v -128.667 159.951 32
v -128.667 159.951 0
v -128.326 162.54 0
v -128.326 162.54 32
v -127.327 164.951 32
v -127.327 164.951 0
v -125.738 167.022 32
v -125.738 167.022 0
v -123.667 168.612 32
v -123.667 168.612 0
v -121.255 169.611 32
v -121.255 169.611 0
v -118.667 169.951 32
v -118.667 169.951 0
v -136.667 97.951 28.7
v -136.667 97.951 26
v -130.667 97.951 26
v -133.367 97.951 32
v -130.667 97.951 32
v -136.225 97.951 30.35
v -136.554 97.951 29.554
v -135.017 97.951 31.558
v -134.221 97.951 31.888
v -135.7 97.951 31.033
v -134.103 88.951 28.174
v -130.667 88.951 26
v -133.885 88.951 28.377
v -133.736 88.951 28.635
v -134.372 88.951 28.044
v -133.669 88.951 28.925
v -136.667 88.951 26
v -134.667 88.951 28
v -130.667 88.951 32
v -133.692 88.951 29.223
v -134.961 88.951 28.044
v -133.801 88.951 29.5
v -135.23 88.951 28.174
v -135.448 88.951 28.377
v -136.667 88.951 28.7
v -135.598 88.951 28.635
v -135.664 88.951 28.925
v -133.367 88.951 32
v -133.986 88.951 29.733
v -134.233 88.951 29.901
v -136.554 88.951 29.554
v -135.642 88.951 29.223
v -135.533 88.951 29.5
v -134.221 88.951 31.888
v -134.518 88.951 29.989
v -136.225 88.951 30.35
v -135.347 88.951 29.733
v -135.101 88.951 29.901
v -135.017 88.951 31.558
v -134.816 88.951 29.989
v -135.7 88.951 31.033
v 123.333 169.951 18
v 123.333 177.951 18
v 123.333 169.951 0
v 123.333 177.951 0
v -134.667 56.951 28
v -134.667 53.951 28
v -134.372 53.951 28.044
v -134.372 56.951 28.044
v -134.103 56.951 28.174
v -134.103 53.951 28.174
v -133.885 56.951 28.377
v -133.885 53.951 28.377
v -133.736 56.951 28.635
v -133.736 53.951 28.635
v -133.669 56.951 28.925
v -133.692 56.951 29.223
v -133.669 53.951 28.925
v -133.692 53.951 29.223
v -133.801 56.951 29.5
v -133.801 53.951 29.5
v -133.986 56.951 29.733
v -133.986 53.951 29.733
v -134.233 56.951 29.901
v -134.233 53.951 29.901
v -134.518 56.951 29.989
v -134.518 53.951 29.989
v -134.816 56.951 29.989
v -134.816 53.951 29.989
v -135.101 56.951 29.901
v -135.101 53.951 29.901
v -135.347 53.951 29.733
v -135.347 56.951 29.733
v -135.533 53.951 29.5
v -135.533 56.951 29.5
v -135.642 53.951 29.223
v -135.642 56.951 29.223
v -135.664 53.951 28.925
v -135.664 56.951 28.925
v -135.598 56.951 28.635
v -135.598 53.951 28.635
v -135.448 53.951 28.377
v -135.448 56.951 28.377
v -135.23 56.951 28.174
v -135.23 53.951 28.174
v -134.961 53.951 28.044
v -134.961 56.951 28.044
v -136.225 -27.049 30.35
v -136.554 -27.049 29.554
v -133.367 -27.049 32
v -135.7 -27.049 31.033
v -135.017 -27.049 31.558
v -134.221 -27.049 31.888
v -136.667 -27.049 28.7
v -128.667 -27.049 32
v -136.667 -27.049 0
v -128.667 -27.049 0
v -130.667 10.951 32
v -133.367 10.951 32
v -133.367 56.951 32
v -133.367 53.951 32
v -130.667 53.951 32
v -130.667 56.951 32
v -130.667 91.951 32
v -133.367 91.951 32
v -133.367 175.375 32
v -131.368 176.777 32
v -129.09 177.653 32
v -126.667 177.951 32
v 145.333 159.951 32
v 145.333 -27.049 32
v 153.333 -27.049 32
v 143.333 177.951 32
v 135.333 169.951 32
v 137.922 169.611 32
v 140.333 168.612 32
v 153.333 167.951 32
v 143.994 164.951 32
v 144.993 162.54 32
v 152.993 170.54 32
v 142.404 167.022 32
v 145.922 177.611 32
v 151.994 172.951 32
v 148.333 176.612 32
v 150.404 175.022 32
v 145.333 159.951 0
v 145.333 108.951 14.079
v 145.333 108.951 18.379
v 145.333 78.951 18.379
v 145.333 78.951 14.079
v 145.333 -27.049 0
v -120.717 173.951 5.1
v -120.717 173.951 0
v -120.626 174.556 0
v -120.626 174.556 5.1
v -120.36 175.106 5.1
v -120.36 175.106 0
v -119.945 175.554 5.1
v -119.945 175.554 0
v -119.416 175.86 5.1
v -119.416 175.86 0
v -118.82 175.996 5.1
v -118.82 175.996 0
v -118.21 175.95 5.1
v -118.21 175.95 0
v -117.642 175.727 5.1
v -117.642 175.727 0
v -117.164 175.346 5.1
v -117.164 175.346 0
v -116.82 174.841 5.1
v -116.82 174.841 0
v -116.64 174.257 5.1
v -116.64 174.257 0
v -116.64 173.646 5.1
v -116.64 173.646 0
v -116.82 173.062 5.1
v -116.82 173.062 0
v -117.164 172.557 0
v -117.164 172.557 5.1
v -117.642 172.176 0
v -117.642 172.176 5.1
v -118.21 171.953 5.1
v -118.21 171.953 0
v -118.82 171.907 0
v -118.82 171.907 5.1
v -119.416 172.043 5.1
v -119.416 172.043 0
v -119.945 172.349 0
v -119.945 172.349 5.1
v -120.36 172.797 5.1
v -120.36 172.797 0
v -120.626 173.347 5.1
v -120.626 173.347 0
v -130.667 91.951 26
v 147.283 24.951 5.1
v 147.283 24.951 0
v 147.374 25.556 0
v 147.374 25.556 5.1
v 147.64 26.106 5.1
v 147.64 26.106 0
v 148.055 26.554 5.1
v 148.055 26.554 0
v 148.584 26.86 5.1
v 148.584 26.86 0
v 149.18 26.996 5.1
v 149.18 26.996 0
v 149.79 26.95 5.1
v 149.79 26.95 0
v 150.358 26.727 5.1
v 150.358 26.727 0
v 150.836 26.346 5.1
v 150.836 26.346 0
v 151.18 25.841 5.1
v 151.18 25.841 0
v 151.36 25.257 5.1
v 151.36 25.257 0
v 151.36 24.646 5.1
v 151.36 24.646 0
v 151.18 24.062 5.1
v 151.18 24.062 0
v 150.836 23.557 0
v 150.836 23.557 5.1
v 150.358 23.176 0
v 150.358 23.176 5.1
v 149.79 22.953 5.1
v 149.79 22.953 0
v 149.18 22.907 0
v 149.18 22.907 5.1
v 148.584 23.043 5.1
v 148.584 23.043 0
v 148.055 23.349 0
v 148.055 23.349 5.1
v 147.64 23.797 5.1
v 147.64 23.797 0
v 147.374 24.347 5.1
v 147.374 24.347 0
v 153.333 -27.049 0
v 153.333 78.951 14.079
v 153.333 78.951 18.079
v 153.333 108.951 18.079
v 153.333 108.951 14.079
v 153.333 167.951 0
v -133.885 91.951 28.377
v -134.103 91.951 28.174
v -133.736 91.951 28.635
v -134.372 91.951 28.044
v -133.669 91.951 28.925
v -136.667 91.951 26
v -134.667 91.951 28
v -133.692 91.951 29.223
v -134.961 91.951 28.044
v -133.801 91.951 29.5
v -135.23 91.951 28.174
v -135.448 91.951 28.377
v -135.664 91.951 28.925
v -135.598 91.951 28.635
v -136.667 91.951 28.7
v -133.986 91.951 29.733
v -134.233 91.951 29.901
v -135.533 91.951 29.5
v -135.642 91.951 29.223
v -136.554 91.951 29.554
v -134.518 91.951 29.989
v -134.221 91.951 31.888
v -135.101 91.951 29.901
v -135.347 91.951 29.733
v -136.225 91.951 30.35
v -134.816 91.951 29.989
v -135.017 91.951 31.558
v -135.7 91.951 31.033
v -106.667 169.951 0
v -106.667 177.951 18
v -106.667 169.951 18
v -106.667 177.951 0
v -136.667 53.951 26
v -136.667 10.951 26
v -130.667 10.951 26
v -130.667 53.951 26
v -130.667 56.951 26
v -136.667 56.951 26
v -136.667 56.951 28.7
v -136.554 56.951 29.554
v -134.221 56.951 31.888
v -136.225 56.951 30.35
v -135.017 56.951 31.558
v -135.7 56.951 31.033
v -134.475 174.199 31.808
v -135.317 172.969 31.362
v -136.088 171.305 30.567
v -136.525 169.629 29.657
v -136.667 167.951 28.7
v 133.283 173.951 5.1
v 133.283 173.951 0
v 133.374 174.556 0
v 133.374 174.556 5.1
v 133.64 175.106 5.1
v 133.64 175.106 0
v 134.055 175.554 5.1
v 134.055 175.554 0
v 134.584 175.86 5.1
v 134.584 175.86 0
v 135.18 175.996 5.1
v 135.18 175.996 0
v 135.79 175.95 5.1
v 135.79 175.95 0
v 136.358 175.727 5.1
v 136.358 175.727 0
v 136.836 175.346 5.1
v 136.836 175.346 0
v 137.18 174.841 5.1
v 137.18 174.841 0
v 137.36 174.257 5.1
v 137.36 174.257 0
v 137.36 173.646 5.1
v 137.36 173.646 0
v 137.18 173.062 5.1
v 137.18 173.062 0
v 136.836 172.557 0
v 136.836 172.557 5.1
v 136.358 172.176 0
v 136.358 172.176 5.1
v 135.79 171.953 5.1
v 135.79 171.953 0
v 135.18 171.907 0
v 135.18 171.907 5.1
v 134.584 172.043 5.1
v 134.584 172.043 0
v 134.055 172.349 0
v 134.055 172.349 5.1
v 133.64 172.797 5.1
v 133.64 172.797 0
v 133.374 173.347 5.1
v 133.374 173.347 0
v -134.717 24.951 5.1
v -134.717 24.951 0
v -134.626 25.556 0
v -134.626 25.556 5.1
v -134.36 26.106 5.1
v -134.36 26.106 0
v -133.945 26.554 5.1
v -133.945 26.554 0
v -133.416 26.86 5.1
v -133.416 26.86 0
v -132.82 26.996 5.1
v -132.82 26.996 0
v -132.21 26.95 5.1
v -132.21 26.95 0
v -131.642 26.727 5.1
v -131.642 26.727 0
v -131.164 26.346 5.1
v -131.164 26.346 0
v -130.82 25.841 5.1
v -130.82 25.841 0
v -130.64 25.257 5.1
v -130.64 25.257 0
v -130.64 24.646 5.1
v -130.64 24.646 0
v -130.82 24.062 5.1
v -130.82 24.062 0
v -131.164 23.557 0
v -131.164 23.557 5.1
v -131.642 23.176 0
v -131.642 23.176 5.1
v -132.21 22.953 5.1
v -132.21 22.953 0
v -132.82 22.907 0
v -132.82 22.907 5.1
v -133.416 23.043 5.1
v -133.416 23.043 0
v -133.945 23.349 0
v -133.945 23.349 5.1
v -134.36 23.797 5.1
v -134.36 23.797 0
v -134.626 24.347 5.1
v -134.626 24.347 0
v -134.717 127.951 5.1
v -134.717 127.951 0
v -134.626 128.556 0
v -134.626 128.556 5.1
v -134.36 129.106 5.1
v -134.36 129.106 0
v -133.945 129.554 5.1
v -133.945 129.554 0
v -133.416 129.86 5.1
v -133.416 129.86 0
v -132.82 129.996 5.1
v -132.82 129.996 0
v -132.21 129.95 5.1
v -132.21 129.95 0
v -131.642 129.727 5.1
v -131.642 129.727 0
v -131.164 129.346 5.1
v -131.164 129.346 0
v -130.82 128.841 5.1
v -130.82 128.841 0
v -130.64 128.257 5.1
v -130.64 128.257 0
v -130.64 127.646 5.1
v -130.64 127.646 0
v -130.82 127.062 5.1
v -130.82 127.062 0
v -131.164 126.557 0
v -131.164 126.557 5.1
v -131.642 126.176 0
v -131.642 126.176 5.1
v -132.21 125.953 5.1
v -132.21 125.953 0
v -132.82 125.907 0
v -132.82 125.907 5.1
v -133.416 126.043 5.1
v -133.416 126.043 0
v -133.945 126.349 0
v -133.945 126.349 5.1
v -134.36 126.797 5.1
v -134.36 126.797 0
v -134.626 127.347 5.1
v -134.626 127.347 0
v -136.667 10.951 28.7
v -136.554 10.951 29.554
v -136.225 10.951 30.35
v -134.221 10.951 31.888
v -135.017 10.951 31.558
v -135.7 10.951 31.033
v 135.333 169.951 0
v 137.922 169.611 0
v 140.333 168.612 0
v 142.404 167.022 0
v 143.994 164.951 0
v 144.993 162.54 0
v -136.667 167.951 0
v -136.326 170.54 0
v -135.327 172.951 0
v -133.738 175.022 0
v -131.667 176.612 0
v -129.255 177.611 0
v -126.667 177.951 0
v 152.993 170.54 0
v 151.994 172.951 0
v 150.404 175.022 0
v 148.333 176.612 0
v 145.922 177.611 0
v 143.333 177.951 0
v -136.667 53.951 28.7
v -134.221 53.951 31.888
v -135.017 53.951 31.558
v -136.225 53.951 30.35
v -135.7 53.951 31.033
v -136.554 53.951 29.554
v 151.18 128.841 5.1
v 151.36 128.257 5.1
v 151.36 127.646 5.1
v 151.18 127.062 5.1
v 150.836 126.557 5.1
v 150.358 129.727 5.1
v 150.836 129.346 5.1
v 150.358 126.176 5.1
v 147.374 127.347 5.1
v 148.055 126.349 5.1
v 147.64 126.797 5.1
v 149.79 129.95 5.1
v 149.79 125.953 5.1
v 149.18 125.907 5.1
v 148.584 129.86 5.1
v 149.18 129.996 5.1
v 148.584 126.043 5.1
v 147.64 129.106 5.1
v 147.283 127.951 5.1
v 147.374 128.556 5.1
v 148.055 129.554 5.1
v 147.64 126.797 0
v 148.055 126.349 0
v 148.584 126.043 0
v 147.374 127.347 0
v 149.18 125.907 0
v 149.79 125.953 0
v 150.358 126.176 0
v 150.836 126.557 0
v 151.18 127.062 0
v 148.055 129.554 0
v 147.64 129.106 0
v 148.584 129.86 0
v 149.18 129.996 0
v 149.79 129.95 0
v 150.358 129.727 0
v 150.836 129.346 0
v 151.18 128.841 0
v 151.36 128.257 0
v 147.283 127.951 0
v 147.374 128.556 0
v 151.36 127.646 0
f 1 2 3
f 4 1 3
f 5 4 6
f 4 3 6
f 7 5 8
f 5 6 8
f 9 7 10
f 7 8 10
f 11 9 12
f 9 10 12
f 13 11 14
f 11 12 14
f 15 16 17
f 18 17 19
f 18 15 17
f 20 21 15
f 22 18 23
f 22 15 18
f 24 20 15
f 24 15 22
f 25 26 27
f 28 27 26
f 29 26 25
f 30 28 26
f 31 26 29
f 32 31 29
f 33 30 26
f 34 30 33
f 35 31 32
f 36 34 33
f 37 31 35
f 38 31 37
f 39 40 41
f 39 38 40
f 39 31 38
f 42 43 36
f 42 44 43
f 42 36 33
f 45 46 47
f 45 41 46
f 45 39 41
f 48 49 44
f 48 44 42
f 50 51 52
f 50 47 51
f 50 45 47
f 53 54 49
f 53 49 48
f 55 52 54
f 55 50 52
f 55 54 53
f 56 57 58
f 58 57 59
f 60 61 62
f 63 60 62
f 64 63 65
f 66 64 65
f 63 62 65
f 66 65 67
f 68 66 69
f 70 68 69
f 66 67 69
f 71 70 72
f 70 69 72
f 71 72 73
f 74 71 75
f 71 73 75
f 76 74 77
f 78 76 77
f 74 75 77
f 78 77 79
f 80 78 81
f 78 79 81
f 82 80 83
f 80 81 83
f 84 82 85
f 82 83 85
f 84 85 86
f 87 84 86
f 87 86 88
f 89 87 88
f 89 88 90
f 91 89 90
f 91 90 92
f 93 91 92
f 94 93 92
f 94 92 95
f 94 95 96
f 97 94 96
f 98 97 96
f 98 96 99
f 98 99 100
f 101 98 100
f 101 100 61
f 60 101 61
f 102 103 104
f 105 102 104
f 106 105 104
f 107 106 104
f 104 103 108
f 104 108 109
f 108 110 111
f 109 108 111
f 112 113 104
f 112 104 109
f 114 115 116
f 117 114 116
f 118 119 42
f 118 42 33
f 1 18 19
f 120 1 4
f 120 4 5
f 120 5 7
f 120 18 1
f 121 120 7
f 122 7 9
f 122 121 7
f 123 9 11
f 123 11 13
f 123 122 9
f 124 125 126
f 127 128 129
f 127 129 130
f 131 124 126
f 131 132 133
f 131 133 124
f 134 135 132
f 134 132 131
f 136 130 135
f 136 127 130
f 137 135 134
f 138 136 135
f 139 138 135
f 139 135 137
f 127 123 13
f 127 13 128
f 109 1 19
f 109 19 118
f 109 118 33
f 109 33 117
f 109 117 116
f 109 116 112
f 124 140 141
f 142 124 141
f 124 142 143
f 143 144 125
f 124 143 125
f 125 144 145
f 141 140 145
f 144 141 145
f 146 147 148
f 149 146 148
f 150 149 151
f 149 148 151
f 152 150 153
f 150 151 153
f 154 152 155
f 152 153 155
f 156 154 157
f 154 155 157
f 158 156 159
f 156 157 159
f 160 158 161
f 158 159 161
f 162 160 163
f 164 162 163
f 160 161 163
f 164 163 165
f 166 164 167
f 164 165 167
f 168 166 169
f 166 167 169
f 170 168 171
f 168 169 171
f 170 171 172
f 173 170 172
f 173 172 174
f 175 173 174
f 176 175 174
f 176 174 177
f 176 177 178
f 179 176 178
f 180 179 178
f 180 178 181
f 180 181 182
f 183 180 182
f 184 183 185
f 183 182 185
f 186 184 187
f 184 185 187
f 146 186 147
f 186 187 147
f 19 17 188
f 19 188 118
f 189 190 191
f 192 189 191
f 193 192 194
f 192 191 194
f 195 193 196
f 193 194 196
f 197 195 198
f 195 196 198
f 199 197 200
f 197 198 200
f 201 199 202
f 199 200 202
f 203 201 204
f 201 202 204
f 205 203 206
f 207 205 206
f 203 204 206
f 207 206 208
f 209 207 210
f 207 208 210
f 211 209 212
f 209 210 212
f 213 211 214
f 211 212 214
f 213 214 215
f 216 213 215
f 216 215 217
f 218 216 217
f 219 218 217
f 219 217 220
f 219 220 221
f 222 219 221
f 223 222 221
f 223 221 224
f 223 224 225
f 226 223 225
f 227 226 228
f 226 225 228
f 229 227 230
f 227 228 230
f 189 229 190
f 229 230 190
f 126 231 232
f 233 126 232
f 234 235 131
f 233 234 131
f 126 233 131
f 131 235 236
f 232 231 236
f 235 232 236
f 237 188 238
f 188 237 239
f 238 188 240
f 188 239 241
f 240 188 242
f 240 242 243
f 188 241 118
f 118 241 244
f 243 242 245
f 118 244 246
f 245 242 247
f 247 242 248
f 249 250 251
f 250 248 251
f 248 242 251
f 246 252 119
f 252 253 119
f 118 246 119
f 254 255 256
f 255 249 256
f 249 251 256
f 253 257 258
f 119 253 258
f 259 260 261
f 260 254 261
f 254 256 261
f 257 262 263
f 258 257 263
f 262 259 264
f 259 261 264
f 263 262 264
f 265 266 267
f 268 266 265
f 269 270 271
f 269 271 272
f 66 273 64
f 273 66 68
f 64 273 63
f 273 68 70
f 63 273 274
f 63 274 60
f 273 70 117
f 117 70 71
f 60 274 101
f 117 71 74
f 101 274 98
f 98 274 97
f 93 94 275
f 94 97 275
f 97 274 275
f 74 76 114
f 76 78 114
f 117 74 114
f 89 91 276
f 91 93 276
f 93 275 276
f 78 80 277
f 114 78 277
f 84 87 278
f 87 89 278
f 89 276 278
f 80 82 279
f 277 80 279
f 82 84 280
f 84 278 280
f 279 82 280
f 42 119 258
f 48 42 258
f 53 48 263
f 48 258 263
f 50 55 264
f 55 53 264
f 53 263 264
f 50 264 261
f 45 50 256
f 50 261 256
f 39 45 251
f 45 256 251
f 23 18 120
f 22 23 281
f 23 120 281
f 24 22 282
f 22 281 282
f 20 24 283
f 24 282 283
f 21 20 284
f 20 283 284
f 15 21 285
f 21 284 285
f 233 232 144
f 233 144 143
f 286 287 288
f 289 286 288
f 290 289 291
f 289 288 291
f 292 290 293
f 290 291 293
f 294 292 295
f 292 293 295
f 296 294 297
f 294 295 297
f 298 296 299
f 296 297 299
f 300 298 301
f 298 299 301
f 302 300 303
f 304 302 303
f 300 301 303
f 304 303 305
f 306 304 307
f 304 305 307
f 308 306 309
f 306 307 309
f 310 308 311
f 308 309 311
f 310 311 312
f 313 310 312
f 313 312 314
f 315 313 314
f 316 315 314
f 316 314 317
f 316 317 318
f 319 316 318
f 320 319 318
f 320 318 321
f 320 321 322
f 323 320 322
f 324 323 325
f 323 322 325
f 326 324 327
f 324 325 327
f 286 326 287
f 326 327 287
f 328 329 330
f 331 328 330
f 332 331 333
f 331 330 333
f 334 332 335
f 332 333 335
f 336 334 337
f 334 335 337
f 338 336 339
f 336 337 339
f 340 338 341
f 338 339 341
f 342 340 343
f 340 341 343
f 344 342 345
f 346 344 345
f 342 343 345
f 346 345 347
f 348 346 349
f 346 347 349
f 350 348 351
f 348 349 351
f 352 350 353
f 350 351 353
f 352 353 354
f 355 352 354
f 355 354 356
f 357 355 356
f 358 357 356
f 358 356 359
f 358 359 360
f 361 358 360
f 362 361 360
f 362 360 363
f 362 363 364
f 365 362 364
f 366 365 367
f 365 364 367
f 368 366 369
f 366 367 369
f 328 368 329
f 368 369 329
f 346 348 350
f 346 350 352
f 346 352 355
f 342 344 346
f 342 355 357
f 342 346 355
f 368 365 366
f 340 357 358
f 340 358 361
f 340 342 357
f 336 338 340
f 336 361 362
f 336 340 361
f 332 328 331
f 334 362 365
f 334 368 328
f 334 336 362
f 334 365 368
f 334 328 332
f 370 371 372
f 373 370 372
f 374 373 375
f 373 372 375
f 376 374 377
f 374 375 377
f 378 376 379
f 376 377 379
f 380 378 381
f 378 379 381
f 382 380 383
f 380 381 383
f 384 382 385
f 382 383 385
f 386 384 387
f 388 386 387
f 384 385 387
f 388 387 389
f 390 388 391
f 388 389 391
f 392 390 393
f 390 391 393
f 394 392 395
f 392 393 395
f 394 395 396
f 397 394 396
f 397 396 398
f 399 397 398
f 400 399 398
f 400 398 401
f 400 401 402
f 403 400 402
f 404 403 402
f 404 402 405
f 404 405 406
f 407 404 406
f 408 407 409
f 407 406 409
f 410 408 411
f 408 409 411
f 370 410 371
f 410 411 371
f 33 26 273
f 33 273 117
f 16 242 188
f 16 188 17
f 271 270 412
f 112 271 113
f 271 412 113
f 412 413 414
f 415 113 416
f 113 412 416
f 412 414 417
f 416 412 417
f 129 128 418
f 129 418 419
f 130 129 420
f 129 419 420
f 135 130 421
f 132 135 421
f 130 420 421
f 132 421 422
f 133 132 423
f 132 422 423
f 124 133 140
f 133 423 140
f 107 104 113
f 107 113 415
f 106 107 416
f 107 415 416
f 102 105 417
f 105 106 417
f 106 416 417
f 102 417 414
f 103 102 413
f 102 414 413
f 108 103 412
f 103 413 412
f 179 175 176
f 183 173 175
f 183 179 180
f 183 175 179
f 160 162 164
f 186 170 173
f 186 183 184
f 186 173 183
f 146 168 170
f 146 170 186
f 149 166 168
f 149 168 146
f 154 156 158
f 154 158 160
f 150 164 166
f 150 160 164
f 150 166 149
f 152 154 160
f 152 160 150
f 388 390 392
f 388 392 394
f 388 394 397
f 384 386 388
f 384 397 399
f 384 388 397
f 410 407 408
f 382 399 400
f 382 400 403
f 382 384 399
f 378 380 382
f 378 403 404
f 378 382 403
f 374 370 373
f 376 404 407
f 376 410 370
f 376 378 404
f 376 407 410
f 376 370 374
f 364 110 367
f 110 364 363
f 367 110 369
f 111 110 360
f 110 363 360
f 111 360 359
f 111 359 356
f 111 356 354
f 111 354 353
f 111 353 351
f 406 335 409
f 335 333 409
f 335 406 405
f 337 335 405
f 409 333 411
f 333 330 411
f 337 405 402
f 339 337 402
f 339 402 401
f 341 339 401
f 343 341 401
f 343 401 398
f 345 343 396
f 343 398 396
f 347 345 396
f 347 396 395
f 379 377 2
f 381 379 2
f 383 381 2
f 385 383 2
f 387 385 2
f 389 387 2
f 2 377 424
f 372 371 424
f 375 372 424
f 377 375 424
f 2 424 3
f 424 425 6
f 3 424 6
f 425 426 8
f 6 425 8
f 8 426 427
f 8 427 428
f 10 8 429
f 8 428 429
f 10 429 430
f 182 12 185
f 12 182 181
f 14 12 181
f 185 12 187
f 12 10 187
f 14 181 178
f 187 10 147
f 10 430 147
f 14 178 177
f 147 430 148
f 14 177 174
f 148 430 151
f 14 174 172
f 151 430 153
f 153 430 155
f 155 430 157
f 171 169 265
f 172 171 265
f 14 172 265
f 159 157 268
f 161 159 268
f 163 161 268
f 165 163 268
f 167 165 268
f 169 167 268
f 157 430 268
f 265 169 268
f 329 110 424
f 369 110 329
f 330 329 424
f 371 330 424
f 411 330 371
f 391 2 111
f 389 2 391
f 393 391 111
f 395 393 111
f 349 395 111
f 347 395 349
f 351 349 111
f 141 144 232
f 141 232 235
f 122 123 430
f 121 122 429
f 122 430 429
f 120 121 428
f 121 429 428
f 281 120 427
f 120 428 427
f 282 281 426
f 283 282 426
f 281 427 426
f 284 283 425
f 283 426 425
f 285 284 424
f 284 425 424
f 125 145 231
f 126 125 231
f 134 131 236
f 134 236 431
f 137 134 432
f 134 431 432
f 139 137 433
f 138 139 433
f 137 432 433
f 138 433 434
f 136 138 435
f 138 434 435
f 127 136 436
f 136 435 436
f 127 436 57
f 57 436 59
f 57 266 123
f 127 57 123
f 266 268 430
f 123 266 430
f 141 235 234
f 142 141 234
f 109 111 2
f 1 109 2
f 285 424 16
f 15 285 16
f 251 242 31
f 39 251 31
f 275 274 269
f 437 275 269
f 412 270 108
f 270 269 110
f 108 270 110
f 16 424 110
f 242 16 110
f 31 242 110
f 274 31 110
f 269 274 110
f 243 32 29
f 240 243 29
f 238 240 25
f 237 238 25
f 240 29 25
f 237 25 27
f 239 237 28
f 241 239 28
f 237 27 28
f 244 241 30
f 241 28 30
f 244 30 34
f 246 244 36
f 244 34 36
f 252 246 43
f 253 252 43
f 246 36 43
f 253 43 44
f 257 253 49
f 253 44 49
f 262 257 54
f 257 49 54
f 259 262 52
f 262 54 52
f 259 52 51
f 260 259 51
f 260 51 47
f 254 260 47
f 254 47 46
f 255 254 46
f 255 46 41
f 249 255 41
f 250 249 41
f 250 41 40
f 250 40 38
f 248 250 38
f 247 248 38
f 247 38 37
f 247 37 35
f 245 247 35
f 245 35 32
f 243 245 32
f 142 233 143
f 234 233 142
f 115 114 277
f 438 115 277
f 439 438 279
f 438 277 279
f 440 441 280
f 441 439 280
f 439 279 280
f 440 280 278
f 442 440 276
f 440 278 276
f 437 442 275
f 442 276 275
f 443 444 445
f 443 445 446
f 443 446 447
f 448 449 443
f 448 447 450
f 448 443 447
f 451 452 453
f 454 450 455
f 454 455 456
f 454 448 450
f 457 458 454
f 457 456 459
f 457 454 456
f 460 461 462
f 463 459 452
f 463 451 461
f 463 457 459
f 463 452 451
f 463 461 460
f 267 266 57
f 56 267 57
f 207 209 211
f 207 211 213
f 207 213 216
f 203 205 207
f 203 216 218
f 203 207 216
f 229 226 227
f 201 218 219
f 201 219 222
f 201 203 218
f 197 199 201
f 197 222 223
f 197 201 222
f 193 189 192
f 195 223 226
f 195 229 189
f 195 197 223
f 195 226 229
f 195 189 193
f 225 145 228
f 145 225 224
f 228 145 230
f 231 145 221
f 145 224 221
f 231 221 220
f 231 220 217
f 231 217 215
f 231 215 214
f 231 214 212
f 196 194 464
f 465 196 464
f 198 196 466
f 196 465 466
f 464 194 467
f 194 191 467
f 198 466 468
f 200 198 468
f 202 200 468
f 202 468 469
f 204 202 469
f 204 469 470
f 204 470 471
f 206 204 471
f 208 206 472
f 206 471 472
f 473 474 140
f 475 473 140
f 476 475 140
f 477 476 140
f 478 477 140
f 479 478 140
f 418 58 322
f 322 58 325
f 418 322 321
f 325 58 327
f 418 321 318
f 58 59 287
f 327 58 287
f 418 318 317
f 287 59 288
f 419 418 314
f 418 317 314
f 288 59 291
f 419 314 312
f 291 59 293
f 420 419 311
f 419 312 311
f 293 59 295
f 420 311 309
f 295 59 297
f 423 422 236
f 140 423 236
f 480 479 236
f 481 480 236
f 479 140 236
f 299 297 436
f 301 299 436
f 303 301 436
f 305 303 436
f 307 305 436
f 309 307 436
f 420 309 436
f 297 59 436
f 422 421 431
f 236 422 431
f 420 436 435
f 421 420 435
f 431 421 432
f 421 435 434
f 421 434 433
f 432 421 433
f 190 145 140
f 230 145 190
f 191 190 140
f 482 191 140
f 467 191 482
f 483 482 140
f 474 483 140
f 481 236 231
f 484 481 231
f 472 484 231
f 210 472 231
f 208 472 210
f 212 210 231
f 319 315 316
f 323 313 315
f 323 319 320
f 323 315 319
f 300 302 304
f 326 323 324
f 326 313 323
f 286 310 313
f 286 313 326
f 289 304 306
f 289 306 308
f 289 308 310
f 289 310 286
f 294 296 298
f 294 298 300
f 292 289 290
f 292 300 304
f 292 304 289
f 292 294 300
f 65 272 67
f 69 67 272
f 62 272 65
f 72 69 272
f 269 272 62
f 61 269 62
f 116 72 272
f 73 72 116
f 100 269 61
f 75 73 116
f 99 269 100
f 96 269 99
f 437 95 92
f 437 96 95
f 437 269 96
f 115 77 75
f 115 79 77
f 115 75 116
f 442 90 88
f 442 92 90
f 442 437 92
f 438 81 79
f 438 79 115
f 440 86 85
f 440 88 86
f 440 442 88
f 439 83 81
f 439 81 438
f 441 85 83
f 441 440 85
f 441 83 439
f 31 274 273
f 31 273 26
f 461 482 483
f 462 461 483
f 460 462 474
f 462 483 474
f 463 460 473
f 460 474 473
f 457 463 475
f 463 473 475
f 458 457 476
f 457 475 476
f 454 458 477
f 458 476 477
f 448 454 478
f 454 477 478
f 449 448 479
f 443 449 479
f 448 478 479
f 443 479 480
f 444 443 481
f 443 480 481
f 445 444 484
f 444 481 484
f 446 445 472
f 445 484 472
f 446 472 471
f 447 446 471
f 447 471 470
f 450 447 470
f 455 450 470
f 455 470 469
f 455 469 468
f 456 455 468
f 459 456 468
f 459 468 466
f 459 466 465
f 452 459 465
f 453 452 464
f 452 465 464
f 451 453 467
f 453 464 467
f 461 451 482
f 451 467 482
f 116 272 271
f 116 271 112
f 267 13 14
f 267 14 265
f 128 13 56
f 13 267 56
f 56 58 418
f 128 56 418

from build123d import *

# Parameters (mm, degrees)
EXTRUDE_1_DEPTH     = 32
SKETCH_2_R          = 2.05
CUT_EXTRUDE_1_DEPTH = 5.1
SKETCH_3_W          = 230
SKETCH_3_H          = 18
CUT_EXTRUDE_2_DEPTH = 8
SKETCH_4_W          = 6
SKETCH_4_H          = 32
SKETCH_4_H_2        = 6
SKETCH_4_H_3        = 43
CUT_EXTRUDE_3_DEPTH = 6
SKETCH_5_R          = 1
CUT_EXTRUDE_4_DEPTH = 38
SKETCH_6_W          = 4
SKETCH_6_H          = 30
CUT_EXTRUDE_5_DEPTH = 335.984621748
CHAMFER_1_SIZE2     = 8
CHAMFER_1_SIZE      = 0.3
CUT_EXTRUDE_6_DEPTH = 258.992463284


with BuildPart() as part:
    # 草图1 → 凸台-拉伸1 (new body)
    with BuildSketch(Plane.XY):
        with BuildLine():
            Line((145.333333333, -27.048611111), (153.333333333, -27.048611111))
            Line((153.333333333, -27.048611111), (153.333333333, 167.951388889))
            ThreePointArc((153.333333333, 167.951388889), (150.404401145, 175.022456701), (143.333333333, 177.951388889))
            Line((143.333333333, 177.951388889), (-126.666666667, 177.951388889))
            ThreePointArc((-126.666666667, 177.951388889), (-133.737734479, 175.022456701), (-136.666666667, 167.951388889))
            Line((-136.666666667, 167.951388889), (-136.666666667, -27.048611111))
            Line((-136.666666667, -27.048611111), (-128.666666667, -27.048611111))
            Line((-128.666666667, -27.048611111), (-128.666666667, 159.951388889))
            ThreePointArc((-128.666666667, 159.951388889), (-125.737734479, 167.022456701), (-118.666666667, 169.951388889))
            Line((-118.666666667, 169.951388889), (135.333333333, 169.951388889))
            ThreePointArc((135.333333333, 169.951388889), (142.404401145, 167.022456701), (145.333333333, 159.951388889))
            Line((145.333333333, 159.951388889), (145.333333333, -27.048611111))
        make_face()
    extrude(amount=EXTRUDE_1_DEPTH)

    # 草图2 → 切除-拉伸1 (cut)
    with BuildSketch(Plane(origin=(0, 0, 0), x_dir=(-1, 0, 0), z_dir=(0, 0, -1))):
        with Locations((132.666666667, 127.951388889)):
            Circle(SKETCH_2_R)
        with Locations((132.666666667, 24.951388889)):
            Circle(SKETCH_2_R)
        with Locations((-149.333333333, 127.951388889)):
            Circle(SKETCH_2_R)
        with Locations((-149.333333333, 24.951388889)):
            Circle(SKETCH_2_R)
        with Locations((-135.333333333, 173.951388889)):
            Circle(SKETCH_2_R)
        with Locations((-8.333333333, 173.951388889)):
            Circle(SKETCH_2_R)
        with Locations((118.666666667, 173.951388889)):
            Circle(SKETCH_2_R)
    extrude(amount=-CUT_EXTRUDE_1_DEPTH, mode=Mode.SUBTRACT)

    # 草图3 → 切除-拉伸2 (cut)
    with BuildSketch(Plane(origin=(0, 177.951388889, 0), x_dir=(1, 0, 0), z_dir=(0, 1, 0))):
        with Locations((8.333333333, -9)):
            Rectangle(SKETCH_3_W, SKETCH_3_H)
    extrude(amount=-CUT_EXTRUDE_2_DEPTH, mode=Mode.SUBTRACT)

    # 草图4 → 切除-拉伸3 (cut)
    with BuildSketch(Plane.ZY.offset(136.666666667)):
        with Locations((29, 72.951388889)):
            Rectangle(SKETCH_4_W, SKETCH_4_H)
        with Locations((29, 94.951388889)):
            Rectangle(SKETCH_4_W, SKETCH_4_H_2)
        with Locations((29, 32.451388889)):
            Rectangle(SKETCH_4_W, SKETCH_4_H_3)
    extrude(amount=-CUT_EXTRUDE_3_DEPTH, mode=Mode.SUBTRACT)

    # 草图5 → 切除-拉伸4 (cut)
    with BuildSketch(Plane.XZ.offset(-53.951388889)):
        with Locations(Location((-134.666666667, 29, 0), (0, 0, 270))):
            Circle(SKETCH_5_R)
    extrude(amount=-CUT_EXTRUDE_4_DEPTH, mode=Mode.SUBTRACT)

    # 草图6 → 切除-拉伸5 (cut, through all)
    with BuildSketch(Plane.ZY.offset(-145.333333333)):
        with Locations((16.078720605, 93.951388889)):
            Rectangle(SKETCH_6_W, SKETCH_6_H)
    extrude(amount=-CUT_EXTRUDE_5_DEPTH, mode=Mode.SUBTRACT)

    # 倒角1
    chamfer_1_edges = [part.edges().sort_by_distance(p)[0] for p in [
        (145.333333333, 93.951388889, 18.078720605),
    ]]
    chamfer_1_side = [part.faces().sort_by_distance(p)[0] for p in [
        (145.333333333, 93.951388889, 18.084720605),
    ]]
    chamfer(chamfer_1_edges, length=CHAMFER_1_SIZE - 0.0001, length2=CHAMFER_1_SIZE2 - 0.0001, reference=chamfer_1_side[0])  # a hair under: the kernel refuses the full size

    # 草图7 → 切除-拉伸6 (cut, through all)
    with BuildSketch(Plane(origin=(0, 177.951388889, 0), x_dir=(1, 0, 0), z_dir=(0, 1, 0))):
        with BuildLine():
            Line((-136.666666667, -28.7), (-136.666666667, -32))
            Line((-136.666666667, -32), (-133.366666667, -32))
            ThreePointArc((-133.366666667, -32), (-135.700119045, -31.033452378), (-136.666666667, -28.7))
        make_face()
    extrude(amount=-CUT_EXTRUDE_6_DEPTH, mode=Mode.SUBTRACT)


solid = part.part
